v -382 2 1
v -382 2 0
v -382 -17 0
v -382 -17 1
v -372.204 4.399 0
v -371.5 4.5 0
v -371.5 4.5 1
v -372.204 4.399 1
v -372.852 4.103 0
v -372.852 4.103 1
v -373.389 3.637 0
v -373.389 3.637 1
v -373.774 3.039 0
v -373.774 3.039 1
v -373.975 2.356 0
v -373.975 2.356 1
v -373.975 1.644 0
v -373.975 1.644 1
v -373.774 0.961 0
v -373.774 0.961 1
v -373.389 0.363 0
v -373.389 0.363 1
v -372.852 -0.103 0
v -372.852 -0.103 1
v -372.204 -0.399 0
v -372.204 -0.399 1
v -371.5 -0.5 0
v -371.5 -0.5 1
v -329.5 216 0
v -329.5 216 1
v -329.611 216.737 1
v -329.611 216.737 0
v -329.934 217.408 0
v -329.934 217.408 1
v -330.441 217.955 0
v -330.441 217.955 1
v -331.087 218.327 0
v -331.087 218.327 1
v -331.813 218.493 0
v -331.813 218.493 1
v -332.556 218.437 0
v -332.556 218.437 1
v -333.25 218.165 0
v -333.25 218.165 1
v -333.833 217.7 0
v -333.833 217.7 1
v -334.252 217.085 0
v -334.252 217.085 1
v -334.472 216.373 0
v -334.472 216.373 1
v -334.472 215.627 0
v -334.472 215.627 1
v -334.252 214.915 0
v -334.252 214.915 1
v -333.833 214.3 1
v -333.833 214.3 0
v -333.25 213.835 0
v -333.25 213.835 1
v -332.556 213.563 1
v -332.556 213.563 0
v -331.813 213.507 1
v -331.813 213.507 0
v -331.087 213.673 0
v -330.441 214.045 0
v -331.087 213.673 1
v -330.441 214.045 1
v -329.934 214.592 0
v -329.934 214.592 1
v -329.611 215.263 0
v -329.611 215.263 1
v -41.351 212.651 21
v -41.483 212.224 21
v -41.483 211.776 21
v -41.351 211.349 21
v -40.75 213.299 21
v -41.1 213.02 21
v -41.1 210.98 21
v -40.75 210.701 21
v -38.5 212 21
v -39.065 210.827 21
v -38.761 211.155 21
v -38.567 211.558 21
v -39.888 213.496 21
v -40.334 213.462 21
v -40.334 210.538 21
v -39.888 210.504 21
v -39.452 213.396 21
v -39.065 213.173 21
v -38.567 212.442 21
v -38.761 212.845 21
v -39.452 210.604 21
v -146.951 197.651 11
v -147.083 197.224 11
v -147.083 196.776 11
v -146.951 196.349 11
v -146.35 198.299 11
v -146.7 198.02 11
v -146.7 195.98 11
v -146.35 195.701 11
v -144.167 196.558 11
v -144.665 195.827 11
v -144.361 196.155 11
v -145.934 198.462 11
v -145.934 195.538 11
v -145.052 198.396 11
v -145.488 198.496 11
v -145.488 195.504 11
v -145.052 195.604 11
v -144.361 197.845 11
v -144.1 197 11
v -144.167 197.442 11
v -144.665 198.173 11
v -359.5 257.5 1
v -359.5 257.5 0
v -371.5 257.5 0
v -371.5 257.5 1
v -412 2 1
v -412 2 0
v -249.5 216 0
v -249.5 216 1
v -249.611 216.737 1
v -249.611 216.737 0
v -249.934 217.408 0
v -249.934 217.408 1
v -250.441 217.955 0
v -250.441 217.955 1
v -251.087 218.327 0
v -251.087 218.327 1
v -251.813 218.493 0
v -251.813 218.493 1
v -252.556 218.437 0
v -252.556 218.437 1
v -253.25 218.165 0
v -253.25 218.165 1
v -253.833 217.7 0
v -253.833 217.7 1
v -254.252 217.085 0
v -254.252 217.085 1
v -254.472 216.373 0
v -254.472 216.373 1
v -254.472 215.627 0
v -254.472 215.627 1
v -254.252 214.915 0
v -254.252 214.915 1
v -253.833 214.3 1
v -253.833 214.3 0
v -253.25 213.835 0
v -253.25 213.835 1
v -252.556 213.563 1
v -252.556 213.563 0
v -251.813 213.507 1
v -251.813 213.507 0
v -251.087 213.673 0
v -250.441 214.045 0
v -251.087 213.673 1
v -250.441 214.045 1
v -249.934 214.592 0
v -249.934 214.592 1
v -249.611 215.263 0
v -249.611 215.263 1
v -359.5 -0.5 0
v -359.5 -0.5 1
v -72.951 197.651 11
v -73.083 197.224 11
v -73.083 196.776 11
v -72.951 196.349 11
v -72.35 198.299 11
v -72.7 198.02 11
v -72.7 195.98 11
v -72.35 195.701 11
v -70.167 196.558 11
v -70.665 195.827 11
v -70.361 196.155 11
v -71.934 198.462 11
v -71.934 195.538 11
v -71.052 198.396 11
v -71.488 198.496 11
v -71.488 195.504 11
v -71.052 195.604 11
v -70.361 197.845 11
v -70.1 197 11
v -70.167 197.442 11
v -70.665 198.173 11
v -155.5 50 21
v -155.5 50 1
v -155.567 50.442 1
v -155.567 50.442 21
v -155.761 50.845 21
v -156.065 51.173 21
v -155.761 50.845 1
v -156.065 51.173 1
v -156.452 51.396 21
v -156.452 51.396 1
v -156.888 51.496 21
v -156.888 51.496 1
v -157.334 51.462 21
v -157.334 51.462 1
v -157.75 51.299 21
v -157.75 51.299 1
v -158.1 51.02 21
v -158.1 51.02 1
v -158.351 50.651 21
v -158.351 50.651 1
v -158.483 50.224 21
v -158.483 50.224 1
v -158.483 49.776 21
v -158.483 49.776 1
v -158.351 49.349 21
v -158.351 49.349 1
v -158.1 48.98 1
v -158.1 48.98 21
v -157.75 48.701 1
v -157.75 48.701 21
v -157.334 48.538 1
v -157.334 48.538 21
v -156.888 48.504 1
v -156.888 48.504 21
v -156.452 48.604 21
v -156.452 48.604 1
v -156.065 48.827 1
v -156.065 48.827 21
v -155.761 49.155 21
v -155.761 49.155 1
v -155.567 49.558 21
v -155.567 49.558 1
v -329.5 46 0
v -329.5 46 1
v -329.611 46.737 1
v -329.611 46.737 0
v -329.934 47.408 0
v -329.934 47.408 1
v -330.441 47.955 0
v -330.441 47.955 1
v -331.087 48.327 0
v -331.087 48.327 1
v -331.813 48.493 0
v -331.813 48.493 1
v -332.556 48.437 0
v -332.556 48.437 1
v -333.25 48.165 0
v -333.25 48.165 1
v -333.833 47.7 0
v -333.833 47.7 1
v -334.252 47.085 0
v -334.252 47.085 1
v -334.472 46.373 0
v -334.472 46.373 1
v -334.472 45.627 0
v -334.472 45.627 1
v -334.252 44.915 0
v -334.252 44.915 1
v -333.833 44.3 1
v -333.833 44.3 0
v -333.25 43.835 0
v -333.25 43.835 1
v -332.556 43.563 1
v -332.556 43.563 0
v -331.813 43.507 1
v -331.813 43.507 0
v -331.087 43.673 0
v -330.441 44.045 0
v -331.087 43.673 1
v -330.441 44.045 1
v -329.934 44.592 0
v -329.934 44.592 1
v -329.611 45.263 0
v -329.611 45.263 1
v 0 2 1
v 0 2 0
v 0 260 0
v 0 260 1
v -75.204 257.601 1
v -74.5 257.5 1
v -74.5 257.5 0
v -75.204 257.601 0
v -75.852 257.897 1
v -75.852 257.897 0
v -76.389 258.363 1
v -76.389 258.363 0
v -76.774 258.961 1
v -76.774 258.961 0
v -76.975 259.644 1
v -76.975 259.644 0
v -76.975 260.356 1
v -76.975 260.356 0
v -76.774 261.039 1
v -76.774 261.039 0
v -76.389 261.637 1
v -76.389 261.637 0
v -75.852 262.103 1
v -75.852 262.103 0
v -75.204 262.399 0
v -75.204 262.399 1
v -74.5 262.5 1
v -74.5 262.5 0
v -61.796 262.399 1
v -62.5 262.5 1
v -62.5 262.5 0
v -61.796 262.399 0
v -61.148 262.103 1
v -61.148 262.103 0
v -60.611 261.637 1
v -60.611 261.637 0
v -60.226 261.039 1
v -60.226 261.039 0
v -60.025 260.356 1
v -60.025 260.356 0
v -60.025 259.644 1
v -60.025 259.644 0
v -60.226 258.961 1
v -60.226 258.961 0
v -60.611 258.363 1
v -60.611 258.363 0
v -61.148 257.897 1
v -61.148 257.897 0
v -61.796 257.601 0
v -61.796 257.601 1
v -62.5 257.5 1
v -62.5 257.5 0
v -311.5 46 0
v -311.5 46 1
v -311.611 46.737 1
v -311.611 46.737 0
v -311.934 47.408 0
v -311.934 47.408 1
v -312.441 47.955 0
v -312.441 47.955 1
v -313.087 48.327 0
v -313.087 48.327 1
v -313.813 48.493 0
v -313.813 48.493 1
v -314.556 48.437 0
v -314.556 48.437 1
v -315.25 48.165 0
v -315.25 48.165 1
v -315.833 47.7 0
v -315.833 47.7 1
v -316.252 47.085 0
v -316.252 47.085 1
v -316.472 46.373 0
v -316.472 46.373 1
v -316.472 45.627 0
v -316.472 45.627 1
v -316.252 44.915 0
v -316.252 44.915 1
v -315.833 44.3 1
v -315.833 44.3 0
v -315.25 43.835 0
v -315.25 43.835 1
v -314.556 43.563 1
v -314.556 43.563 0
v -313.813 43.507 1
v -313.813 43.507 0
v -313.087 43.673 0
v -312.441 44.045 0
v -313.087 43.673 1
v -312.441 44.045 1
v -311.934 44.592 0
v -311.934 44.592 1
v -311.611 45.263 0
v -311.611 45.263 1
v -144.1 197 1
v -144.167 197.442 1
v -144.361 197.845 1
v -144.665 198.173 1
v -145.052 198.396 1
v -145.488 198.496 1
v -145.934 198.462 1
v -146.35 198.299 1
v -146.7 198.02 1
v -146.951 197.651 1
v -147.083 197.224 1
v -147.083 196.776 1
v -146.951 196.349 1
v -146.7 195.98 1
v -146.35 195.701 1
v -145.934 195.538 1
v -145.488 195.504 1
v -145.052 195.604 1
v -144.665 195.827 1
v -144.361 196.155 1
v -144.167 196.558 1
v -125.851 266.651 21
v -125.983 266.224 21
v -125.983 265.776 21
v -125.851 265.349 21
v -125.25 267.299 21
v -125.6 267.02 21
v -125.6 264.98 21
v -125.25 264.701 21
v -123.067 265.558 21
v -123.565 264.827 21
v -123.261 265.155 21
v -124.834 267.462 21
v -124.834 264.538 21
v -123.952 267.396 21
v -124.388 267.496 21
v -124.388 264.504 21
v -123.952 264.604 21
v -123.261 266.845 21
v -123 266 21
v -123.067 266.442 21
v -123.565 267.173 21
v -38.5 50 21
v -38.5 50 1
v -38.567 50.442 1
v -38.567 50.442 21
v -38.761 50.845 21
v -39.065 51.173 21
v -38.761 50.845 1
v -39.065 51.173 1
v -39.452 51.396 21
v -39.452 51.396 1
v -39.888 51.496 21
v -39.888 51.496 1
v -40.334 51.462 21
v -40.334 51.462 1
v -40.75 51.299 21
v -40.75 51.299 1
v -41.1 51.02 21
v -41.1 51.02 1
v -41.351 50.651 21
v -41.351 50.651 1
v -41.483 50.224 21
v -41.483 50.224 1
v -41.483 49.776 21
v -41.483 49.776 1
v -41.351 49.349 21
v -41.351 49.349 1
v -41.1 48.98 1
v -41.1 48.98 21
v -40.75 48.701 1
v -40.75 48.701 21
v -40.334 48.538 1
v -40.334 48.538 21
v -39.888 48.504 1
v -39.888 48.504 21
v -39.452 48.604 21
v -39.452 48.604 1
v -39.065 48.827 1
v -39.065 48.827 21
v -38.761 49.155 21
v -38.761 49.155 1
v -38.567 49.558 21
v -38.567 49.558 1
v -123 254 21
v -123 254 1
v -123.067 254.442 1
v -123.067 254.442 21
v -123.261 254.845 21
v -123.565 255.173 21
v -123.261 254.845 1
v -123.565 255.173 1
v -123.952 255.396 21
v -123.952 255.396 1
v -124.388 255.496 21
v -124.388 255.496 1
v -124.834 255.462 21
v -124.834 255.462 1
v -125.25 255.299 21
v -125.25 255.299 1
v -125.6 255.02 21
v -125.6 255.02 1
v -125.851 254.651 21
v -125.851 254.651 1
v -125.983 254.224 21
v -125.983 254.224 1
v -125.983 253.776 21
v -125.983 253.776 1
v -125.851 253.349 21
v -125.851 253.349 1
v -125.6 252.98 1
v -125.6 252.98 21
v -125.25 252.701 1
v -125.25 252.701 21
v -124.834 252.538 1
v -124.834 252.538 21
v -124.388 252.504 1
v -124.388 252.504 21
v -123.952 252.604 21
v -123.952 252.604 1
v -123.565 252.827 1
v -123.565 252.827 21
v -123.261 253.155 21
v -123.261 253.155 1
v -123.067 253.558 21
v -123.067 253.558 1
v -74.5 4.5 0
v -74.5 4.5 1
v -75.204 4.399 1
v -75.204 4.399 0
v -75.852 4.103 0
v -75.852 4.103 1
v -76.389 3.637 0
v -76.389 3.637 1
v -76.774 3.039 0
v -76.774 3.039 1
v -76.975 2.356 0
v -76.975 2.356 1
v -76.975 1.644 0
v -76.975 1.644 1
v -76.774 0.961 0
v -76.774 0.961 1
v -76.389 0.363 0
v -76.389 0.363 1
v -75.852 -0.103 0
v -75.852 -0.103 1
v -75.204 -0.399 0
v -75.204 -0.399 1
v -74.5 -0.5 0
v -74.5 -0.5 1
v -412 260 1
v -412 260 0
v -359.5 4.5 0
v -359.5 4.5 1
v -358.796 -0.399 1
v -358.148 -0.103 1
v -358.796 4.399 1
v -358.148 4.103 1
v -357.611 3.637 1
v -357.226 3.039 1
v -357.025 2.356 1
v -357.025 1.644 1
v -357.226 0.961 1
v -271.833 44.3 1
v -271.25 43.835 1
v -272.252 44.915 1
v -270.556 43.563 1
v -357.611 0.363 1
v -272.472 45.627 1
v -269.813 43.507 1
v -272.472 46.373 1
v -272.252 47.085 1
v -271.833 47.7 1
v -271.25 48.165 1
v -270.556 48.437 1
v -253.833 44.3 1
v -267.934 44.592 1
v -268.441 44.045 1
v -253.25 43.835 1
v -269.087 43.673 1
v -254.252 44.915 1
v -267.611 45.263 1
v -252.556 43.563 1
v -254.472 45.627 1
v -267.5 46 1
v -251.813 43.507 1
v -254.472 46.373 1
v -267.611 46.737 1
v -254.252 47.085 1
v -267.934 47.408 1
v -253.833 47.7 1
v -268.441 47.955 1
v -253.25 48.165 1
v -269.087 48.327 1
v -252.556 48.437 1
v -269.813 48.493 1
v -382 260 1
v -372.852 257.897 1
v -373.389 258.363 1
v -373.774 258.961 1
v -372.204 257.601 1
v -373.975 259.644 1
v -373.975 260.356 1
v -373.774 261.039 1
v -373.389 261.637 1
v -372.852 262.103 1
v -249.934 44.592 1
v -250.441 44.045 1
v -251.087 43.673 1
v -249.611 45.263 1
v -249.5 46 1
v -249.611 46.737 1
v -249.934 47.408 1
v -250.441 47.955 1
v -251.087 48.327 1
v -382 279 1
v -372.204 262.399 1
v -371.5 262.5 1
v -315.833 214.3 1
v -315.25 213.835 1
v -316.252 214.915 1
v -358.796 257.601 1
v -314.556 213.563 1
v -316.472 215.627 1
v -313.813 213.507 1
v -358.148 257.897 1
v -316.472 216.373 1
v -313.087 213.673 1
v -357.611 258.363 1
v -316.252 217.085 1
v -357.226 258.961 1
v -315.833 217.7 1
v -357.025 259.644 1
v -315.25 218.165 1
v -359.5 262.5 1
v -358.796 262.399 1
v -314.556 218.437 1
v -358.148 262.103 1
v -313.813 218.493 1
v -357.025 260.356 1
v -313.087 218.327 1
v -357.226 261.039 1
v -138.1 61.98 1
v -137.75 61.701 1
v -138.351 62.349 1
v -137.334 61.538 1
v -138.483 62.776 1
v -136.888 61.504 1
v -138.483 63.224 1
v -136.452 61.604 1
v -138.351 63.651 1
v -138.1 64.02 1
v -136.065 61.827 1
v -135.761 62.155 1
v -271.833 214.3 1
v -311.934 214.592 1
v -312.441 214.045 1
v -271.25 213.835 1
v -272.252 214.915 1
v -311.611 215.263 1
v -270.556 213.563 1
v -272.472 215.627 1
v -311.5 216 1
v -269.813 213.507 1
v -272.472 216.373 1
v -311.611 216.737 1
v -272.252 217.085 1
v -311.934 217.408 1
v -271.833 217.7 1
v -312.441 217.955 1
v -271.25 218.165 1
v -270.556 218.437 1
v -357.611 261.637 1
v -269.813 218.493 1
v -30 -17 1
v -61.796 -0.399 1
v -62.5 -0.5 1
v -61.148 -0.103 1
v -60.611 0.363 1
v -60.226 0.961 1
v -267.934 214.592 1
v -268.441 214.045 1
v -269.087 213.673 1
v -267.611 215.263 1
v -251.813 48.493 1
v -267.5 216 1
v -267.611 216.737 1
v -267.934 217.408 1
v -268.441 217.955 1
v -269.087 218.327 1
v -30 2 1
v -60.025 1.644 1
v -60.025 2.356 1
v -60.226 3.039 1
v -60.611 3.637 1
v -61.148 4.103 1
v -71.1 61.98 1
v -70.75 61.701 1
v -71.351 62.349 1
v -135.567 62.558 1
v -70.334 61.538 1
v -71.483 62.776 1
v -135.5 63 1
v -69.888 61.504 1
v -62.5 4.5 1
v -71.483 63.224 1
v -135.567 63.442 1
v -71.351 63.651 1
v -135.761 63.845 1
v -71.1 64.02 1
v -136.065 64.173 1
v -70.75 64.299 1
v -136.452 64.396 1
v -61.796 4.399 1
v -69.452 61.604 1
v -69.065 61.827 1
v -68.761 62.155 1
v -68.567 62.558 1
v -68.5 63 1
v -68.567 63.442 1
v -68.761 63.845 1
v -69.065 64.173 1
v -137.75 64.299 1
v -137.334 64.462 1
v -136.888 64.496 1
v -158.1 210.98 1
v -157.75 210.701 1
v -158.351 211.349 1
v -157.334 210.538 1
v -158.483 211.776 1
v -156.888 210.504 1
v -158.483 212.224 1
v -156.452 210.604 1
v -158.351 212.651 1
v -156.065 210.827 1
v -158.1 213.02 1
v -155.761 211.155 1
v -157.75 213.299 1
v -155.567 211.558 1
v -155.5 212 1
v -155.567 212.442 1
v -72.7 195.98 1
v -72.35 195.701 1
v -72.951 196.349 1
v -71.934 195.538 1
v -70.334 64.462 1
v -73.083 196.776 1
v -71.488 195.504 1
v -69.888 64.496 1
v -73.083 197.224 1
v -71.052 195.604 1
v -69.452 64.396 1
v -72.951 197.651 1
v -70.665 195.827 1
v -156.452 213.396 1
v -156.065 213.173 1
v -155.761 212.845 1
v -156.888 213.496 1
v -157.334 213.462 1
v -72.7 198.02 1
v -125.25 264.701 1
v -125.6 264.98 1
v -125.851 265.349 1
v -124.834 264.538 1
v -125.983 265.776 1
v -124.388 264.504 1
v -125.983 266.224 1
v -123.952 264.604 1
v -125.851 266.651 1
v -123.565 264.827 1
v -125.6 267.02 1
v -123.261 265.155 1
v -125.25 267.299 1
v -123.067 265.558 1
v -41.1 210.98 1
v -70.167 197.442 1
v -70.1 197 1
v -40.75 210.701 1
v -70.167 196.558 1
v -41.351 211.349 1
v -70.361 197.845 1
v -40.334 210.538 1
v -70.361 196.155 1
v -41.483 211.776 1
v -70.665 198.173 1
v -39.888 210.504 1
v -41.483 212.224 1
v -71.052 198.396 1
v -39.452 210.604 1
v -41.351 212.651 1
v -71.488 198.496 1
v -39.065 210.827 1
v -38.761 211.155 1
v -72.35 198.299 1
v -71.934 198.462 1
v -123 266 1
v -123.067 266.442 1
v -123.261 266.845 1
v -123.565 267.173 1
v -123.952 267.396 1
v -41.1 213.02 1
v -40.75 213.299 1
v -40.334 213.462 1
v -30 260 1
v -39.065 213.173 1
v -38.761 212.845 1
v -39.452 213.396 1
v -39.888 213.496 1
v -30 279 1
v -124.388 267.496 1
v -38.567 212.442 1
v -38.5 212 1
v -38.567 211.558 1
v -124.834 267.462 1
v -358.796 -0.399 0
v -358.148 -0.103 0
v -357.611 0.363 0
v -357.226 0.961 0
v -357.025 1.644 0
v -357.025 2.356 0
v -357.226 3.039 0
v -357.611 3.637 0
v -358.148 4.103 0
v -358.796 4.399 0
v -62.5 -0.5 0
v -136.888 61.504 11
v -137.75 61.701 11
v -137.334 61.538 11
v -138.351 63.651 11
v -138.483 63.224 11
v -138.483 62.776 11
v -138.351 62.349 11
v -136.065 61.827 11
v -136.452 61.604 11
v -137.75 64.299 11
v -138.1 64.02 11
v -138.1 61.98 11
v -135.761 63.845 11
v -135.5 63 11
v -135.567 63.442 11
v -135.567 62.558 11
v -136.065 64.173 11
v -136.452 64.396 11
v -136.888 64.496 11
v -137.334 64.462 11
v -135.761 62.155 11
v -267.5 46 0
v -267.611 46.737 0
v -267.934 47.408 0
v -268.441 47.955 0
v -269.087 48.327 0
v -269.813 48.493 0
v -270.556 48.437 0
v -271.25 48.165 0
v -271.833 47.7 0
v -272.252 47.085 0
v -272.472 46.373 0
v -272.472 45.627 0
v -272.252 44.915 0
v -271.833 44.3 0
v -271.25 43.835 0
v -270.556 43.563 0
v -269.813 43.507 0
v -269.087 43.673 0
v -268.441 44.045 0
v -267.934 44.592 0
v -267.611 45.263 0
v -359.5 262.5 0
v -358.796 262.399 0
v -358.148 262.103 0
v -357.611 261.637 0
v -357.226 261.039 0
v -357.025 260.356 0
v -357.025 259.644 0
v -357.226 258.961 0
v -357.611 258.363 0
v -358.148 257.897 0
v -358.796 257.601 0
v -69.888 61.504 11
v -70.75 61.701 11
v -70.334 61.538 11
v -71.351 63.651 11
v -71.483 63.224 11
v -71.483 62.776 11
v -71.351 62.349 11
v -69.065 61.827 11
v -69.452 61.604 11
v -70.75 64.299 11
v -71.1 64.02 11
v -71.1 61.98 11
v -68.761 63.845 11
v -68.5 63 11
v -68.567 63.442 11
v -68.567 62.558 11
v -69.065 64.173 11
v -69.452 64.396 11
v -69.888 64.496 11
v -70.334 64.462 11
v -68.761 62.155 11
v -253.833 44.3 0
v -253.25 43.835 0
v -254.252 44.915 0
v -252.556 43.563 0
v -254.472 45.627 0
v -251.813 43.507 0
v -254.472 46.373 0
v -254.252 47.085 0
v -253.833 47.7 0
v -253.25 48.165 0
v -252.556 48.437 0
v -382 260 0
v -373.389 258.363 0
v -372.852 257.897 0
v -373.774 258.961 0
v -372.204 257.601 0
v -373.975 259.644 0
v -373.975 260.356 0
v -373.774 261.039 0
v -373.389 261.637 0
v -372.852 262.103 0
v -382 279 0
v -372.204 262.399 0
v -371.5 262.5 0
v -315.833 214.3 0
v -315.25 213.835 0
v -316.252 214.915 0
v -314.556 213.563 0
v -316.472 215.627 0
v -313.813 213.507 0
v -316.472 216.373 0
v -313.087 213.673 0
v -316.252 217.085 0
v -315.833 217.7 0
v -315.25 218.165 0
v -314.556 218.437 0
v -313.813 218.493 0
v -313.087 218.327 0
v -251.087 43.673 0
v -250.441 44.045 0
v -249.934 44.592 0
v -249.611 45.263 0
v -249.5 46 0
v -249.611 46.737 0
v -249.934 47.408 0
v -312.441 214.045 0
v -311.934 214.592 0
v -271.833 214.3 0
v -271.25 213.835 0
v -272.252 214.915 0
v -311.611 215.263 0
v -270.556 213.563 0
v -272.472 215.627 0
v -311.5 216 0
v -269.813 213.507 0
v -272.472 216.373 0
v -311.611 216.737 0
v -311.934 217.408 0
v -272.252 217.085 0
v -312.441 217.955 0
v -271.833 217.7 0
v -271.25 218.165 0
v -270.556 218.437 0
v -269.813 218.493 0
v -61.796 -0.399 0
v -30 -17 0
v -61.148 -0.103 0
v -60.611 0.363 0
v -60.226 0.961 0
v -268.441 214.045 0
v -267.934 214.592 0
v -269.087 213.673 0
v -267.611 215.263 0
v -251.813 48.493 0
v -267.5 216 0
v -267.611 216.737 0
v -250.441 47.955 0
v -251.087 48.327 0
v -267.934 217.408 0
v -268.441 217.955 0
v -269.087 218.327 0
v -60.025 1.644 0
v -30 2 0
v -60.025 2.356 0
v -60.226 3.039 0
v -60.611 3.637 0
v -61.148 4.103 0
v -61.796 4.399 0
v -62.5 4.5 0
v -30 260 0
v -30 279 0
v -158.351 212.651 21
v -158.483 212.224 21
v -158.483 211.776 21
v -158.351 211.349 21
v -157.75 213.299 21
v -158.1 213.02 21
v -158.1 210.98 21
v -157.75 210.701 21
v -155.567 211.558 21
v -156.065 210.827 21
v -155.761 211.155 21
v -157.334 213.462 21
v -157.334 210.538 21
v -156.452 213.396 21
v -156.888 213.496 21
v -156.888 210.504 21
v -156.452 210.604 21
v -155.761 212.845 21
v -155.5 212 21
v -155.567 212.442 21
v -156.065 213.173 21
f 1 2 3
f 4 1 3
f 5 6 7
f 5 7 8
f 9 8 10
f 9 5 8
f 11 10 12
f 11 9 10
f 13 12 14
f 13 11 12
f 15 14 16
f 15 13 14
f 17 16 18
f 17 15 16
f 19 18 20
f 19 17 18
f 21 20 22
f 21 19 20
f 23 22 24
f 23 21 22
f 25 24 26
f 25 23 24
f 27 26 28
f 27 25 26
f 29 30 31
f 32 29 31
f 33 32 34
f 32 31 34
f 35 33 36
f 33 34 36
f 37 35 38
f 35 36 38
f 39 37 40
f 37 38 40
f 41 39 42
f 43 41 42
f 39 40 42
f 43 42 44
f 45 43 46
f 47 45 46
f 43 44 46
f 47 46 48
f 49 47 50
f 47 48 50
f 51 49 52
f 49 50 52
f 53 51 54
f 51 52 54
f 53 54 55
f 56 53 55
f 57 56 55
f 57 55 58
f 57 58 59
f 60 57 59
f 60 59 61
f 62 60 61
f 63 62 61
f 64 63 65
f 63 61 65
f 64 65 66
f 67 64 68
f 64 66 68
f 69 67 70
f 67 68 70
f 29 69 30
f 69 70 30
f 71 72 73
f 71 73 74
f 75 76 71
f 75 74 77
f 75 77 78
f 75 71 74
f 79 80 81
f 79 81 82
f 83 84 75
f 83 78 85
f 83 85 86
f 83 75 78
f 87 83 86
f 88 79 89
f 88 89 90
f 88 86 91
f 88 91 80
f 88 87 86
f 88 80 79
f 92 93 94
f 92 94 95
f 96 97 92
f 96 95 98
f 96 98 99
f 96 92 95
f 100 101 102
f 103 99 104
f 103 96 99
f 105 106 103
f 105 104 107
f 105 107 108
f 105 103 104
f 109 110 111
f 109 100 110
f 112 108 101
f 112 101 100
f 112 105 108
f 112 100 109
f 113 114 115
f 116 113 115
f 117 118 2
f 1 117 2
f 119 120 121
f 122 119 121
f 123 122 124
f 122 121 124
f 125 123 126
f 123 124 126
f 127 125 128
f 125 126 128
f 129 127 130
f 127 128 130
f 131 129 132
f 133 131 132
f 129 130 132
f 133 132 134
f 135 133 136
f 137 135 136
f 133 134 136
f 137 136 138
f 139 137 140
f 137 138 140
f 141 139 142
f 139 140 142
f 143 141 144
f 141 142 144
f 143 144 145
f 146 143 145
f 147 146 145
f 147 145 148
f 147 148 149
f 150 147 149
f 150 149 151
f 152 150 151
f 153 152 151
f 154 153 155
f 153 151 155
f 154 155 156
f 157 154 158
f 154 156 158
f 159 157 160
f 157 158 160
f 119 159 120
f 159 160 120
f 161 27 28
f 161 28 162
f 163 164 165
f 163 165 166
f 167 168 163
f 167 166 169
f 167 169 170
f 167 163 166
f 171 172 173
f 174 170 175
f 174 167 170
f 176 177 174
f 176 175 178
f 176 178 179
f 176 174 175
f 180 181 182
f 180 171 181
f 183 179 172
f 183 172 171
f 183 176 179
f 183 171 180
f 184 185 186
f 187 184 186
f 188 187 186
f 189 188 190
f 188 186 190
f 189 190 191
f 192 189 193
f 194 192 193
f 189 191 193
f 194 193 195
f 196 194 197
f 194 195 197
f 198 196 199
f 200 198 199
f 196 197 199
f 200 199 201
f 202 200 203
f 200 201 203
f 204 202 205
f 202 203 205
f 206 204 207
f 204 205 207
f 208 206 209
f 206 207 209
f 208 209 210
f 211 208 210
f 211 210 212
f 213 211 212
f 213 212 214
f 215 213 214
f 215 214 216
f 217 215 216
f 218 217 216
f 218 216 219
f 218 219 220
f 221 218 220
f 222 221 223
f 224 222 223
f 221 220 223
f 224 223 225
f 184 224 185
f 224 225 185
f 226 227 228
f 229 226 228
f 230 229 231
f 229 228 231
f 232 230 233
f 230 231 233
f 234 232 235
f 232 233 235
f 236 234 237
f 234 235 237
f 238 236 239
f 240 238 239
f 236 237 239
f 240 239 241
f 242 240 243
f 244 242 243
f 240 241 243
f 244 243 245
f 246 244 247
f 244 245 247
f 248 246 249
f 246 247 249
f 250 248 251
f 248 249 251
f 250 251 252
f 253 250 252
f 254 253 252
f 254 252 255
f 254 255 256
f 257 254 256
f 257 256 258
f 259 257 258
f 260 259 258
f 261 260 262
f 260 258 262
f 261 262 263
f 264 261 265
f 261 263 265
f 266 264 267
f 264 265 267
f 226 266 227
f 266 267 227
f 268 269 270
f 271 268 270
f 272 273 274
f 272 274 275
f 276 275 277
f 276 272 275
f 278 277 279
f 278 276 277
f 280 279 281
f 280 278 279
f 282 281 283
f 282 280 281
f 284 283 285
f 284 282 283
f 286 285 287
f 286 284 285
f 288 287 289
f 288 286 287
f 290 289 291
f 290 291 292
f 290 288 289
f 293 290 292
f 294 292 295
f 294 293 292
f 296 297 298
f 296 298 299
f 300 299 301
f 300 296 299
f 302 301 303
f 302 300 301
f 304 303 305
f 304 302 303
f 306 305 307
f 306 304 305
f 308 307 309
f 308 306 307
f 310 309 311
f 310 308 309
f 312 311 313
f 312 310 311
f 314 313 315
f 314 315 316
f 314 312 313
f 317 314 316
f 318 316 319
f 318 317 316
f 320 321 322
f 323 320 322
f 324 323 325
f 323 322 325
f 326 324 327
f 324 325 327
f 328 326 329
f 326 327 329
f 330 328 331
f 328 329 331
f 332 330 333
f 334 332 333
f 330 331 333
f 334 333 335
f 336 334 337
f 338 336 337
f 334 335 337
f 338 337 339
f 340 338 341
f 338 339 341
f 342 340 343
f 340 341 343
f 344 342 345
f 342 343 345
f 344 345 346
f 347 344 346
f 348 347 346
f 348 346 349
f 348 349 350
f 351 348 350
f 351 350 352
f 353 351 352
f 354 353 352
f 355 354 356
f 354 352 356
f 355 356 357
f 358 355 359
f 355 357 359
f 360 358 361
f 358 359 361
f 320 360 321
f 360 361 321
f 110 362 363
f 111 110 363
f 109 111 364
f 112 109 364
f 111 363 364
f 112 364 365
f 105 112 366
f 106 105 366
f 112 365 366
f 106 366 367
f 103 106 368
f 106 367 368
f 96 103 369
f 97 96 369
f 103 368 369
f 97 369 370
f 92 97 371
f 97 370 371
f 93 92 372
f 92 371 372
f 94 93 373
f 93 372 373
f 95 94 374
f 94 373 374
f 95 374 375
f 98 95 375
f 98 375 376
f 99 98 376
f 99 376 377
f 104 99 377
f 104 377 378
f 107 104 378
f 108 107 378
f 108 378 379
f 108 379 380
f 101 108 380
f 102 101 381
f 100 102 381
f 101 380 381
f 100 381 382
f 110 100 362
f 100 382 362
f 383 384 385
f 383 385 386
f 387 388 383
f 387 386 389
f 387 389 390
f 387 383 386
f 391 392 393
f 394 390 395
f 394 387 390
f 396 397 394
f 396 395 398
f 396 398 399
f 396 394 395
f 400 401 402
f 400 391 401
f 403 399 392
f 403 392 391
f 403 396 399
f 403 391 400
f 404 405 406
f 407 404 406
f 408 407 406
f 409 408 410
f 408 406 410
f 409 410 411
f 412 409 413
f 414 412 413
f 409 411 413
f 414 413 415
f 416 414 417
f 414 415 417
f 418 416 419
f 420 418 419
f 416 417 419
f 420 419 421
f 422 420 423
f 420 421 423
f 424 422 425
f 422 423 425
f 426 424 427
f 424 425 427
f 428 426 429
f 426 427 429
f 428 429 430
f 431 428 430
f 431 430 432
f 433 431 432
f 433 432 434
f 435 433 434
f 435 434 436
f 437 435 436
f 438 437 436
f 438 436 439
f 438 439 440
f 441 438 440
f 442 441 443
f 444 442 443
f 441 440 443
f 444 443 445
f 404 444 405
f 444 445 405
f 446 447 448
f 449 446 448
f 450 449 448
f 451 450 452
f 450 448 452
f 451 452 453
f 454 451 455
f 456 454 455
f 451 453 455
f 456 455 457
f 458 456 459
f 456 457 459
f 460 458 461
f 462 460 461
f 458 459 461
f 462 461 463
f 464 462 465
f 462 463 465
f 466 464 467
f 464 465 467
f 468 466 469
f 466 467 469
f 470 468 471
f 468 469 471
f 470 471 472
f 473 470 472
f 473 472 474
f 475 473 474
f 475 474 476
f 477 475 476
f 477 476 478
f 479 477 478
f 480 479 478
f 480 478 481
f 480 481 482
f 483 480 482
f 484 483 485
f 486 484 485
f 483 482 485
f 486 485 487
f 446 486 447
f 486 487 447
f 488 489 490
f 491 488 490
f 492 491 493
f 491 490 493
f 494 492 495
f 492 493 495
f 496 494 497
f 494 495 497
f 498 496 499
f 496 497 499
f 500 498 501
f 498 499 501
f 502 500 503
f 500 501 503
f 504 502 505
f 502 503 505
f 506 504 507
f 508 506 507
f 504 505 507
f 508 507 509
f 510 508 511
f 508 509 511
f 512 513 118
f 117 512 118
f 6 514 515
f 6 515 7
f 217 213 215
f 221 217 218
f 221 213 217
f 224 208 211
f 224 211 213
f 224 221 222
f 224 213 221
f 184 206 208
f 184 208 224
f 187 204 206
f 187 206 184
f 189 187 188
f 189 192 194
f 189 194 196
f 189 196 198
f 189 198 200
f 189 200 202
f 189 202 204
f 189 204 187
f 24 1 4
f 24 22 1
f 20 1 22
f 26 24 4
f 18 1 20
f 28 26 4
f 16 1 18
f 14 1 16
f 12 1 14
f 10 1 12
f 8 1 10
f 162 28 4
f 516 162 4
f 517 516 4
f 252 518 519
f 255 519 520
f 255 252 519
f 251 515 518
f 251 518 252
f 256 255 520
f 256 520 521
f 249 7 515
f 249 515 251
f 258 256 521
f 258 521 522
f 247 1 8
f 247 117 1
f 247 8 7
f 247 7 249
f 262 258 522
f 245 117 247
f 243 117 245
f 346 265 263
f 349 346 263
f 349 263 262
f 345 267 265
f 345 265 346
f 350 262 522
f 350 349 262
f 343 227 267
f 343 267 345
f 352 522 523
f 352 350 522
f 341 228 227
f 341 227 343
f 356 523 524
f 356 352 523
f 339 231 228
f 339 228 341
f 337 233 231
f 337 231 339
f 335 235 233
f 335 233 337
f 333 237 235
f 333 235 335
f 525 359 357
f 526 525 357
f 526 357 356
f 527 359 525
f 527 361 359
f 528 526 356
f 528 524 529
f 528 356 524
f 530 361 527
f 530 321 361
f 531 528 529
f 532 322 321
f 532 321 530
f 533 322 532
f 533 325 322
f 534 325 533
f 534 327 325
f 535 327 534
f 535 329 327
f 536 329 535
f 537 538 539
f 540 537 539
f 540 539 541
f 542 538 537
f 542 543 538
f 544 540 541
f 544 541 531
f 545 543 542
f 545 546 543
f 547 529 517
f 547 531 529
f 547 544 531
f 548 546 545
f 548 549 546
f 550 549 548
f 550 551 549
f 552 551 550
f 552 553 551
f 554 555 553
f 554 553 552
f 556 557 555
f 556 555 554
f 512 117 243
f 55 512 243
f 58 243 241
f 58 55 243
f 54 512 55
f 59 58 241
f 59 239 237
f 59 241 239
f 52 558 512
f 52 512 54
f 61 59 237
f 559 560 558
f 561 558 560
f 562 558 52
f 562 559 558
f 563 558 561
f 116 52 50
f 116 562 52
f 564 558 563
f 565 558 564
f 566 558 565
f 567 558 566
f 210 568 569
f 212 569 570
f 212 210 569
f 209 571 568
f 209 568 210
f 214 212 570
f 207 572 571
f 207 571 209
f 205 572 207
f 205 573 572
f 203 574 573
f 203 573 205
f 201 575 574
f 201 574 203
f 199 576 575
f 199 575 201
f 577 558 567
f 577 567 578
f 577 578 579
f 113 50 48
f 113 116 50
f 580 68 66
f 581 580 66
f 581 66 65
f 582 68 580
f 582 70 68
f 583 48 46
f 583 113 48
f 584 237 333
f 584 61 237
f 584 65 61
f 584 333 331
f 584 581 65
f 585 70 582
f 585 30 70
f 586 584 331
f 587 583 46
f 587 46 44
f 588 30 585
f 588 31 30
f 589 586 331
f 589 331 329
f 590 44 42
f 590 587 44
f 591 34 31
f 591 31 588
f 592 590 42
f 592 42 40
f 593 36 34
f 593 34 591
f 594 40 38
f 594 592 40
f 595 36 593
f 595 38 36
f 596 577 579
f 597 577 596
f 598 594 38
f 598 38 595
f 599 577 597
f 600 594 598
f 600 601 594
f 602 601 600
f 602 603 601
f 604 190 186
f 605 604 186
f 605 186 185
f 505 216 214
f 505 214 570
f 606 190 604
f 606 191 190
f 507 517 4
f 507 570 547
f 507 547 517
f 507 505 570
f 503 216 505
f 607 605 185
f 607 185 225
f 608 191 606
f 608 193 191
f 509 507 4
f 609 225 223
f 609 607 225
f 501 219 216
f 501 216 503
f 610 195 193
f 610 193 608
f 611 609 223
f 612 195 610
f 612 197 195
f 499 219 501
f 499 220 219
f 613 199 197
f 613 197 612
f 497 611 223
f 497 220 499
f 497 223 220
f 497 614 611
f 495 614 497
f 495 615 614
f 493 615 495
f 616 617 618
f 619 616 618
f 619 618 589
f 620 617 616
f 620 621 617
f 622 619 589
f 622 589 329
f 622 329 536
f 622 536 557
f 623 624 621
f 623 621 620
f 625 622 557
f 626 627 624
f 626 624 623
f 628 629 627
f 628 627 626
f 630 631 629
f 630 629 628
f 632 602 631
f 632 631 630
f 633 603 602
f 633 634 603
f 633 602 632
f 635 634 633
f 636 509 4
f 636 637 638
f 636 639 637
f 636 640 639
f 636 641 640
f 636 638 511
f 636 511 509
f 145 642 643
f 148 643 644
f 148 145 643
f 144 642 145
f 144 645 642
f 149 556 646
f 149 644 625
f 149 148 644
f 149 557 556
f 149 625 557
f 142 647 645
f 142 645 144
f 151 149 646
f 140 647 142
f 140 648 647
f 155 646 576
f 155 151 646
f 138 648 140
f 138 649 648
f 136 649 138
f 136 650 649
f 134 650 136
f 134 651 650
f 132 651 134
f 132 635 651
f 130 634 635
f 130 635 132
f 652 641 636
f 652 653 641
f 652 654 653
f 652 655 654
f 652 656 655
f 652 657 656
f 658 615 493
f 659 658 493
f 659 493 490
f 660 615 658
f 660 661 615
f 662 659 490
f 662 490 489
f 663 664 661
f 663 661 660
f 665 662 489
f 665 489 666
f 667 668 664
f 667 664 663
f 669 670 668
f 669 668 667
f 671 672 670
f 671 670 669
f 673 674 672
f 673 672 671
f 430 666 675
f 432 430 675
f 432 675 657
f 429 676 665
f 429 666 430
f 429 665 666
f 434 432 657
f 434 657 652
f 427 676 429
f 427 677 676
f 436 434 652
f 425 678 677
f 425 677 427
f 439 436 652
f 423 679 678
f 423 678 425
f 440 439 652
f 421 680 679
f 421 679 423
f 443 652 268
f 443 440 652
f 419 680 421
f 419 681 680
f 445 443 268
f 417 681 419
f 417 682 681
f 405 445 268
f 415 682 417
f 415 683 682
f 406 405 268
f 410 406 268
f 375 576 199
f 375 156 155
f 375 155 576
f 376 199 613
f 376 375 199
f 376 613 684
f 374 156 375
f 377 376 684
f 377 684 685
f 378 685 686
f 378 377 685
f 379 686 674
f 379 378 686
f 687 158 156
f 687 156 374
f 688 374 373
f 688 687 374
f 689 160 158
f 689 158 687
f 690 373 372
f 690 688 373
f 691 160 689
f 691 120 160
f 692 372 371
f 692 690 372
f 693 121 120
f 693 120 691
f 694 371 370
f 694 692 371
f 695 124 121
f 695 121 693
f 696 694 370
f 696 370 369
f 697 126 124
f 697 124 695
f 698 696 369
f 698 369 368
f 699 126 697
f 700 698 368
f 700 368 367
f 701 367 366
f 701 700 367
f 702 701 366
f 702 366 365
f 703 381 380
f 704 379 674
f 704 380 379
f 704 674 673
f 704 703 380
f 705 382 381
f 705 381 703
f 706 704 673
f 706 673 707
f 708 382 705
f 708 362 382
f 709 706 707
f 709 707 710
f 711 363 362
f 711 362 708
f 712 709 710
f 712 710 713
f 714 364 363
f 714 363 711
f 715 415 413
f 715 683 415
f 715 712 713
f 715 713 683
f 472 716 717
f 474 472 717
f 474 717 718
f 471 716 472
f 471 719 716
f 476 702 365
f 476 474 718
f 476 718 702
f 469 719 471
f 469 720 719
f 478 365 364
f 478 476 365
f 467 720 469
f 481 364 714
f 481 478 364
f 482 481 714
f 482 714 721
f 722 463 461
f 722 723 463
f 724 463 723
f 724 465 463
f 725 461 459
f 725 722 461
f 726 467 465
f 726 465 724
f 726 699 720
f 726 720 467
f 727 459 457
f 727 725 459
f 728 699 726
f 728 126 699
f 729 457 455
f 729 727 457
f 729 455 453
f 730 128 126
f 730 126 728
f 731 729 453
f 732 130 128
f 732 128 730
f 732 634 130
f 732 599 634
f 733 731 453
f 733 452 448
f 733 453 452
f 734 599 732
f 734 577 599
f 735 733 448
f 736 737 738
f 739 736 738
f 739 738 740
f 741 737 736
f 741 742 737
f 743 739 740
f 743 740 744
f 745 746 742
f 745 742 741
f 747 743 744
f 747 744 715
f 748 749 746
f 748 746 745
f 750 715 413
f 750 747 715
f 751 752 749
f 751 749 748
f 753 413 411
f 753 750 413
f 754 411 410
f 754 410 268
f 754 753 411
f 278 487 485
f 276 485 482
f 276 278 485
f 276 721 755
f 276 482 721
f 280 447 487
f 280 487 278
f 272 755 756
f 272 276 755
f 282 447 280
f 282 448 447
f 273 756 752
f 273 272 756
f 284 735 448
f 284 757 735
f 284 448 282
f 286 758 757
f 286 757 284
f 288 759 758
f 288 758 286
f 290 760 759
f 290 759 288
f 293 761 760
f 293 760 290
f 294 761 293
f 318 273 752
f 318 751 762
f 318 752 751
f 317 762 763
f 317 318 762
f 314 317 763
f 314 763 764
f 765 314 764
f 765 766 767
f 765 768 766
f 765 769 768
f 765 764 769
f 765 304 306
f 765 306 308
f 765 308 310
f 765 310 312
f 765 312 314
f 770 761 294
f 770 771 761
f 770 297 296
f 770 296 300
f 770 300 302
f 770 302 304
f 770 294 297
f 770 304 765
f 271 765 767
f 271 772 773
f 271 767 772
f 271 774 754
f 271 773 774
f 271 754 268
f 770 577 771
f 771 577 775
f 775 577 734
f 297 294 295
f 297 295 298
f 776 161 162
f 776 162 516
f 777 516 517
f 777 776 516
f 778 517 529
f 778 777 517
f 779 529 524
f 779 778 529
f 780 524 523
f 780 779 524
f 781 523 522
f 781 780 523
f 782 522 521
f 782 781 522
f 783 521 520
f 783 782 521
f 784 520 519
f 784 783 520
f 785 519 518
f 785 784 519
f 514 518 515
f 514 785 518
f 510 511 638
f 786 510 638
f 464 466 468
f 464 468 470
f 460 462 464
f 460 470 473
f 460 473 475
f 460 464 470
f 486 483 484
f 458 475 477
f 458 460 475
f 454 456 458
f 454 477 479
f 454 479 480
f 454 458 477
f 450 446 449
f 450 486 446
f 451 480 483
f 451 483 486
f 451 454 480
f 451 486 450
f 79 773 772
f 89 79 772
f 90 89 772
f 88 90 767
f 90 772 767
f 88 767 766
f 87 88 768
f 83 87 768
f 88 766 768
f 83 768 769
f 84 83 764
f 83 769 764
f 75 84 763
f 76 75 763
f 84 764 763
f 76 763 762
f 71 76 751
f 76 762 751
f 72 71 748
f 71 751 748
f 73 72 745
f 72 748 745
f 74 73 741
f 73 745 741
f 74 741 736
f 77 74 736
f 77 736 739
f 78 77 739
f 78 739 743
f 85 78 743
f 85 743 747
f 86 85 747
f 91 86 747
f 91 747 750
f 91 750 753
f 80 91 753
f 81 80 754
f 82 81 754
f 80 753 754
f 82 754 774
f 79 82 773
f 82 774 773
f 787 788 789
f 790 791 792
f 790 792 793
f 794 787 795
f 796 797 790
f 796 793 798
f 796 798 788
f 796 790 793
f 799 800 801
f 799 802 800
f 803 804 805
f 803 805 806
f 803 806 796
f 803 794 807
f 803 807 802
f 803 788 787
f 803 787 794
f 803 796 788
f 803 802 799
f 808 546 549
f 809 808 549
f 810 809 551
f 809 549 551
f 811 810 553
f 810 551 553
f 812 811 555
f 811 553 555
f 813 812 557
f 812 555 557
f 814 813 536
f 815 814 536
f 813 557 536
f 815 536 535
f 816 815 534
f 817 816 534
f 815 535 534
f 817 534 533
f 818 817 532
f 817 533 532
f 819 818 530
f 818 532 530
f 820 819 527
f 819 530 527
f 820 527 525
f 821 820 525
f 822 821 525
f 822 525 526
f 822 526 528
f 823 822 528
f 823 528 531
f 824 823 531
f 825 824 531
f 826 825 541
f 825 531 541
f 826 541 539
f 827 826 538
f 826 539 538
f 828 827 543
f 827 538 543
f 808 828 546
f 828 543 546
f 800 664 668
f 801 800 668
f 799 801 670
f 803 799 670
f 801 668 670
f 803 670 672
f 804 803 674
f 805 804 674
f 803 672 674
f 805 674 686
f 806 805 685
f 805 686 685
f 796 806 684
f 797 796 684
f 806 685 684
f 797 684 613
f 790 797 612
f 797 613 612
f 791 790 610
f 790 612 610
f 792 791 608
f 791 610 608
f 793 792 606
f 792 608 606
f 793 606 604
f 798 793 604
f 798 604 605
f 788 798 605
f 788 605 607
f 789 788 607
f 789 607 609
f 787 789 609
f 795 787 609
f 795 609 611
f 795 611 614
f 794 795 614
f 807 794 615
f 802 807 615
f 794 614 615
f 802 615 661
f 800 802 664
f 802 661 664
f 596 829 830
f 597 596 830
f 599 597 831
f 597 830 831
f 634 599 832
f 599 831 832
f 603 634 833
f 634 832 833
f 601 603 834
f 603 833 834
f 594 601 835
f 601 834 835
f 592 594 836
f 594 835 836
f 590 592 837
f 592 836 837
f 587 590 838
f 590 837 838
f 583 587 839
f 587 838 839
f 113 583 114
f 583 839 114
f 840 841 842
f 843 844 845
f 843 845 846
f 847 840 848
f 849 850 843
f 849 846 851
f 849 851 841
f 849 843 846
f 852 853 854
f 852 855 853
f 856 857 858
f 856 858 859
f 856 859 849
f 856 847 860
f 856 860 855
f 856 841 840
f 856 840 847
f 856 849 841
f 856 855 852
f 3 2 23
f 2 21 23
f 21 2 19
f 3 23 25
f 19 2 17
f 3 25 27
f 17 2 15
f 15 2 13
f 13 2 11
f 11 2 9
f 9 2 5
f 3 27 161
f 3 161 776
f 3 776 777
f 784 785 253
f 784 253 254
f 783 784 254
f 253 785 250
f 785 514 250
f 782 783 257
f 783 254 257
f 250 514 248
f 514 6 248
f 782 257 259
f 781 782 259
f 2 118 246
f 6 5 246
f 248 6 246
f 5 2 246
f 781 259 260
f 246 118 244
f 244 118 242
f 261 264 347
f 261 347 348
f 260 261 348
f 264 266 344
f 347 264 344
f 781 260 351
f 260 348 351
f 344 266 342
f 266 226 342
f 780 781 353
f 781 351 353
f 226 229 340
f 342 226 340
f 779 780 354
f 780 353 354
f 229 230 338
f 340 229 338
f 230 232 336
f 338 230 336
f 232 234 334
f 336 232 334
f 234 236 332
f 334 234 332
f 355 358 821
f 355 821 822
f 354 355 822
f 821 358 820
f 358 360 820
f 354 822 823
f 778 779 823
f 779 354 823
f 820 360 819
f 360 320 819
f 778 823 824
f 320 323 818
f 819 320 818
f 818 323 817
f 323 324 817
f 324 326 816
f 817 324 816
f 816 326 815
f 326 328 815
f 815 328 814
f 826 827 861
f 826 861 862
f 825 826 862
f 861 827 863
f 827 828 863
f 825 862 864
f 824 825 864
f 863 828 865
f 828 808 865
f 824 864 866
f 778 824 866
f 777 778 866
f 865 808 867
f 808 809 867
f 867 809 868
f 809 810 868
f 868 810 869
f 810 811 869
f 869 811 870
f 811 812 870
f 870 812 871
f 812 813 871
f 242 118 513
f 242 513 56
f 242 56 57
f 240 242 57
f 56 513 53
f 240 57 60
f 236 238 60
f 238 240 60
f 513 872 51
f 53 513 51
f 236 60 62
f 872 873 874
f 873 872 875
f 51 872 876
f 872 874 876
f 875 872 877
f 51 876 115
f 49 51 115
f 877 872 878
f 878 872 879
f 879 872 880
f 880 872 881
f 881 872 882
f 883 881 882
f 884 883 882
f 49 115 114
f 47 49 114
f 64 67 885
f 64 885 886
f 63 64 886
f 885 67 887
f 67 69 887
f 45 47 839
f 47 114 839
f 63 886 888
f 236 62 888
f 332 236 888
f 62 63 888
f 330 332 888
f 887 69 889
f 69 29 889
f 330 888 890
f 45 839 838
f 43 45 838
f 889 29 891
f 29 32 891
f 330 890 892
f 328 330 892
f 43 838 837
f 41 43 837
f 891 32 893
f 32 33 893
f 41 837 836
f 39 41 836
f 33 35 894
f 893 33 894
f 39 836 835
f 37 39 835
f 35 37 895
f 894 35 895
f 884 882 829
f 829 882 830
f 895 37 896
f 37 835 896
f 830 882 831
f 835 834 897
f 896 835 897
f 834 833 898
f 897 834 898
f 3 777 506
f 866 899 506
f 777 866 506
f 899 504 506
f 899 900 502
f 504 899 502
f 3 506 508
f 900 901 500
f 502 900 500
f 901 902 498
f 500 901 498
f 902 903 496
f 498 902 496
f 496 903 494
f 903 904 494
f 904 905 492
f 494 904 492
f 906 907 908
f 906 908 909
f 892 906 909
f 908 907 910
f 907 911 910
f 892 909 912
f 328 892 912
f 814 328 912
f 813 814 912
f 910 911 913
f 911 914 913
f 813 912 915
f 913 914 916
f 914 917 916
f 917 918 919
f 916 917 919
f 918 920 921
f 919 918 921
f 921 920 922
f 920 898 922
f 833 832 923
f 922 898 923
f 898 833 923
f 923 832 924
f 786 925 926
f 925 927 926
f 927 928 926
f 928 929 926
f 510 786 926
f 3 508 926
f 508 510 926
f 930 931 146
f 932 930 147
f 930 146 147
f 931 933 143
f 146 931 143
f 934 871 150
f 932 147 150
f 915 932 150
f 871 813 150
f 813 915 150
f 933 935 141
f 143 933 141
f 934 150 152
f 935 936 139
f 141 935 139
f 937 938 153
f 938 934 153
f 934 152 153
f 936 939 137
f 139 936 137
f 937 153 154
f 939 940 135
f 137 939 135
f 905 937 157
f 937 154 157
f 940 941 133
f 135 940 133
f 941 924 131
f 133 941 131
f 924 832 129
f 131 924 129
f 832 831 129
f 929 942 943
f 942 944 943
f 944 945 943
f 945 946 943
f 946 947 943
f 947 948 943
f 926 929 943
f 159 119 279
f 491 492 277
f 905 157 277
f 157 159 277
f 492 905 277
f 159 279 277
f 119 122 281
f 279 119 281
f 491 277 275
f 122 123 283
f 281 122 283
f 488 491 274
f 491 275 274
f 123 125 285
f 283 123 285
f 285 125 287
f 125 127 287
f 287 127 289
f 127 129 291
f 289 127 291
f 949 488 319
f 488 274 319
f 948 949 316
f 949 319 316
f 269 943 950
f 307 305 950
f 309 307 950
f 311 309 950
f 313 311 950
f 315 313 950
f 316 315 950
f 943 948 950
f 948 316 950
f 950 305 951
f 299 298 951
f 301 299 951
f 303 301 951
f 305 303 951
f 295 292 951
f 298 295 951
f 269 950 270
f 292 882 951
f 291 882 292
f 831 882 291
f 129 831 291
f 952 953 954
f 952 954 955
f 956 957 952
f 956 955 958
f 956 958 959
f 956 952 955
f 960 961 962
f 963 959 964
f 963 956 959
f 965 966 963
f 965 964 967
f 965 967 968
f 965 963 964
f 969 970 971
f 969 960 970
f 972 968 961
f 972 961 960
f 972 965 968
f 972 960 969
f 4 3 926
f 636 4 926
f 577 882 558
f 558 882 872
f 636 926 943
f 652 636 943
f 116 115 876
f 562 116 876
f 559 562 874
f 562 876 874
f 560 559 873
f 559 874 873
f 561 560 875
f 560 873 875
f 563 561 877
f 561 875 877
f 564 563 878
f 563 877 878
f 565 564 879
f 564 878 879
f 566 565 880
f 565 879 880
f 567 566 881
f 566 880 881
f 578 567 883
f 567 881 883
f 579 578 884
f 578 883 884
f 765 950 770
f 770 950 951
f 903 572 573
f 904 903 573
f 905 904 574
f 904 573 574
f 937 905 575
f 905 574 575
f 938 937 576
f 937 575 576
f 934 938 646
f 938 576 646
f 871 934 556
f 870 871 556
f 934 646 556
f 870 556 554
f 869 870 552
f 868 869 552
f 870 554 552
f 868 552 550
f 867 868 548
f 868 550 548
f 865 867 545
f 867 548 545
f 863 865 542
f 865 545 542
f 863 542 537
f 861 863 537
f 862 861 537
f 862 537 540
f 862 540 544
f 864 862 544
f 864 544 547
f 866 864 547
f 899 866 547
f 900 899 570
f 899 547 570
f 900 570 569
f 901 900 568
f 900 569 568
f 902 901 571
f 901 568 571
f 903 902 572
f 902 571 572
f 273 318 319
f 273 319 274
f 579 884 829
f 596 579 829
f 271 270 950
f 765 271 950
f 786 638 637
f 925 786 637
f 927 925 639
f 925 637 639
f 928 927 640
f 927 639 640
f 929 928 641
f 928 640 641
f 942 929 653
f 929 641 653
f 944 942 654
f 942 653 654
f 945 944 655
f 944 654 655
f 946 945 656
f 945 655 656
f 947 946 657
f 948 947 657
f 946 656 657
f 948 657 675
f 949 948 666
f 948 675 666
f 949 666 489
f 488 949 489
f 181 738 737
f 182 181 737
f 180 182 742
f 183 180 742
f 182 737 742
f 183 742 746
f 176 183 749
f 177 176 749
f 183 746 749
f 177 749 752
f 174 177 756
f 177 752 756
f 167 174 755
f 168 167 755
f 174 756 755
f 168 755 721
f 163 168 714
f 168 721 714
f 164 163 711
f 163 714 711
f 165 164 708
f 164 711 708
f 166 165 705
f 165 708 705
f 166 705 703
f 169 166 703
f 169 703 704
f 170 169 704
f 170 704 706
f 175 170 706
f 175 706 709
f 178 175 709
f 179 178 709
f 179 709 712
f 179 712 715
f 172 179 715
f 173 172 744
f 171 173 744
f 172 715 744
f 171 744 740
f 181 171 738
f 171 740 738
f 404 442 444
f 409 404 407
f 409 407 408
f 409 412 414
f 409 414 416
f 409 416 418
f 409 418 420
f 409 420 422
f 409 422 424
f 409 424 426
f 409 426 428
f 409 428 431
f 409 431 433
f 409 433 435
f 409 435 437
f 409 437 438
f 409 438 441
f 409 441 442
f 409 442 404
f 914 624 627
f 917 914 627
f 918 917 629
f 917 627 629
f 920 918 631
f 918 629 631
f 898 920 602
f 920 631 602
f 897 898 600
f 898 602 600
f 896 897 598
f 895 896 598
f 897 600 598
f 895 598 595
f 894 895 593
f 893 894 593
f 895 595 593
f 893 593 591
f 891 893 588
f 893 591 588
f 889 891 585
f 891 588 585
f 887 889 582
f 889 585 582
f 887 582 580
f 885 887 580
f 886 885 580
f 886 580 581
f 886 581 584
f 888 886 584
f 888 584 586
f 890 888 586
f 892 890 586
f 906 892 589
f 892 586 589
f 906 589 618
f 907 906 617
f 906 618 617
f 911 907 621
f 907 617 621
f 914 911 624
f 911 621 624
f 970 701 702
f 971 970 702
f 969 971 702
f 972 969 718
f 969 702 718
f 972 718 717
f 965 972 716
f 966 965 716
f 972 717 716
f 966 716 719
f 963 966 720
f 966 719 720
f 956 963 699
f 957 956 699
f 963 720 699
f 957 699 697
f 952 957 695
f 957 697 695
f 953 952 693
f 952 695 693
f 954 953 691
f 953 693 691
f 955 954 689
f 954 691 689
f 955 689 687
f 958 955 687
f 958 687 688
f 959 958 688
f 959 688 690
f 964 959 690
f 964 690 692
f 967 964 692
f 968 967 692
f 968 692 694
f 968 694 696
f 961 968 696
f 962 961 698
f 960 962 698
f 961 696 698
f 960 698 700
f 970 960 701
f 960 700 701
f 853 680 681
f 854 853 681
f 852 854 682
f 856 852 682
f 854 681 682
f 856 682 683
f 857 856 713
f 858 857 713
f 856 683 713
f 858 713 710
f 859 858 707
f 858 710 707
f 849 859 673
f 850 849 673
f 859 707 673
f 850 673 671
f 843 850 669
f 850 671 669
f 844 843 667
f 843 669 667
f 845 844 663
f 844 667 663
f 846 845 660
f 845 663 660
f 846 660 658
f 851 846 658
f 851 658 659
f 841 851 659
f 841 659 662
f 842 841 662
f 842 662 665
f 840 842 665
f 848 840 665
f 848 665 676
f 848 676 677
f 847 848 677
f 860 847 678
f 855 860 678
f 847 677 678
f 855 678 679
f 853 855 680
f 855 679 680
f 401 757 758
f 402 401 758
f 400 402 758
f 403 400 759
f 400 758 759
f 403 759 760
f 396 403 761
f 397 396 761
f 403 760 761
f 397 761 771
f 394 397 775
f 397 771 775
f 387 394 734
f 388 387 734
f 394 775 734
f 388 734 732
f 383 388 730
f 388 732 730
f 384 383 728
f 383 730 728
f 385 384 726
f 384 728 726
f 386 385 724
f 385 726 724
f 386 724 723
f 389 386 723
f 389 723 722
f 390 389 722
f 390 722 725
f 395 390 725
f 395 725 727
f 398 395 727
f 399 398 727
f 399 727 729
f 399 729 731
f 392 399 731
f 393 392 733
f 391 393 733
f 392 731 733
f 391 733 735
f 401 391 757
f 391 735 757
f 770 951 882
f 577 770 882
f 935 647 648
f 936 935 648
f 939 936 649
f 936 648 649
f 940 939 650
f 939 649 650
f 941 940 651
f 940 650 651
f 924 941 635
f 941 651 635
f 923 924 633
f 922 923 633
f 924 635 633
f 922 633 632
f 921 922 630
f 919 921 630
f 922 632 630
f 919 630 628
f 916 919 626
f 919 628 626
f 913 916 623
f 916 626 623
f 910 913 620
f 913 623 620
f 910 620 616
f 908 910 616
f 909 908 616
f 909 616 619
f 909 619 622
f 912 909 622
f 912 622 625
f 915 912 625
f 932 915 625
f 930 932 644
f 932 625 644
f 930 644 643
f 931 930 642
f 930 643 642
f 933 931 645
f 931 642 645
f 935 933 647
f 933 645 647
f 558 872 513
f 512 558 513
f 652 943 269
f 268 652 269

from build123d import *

# Parameters (mm, degrees)
SALIENTE_EXTRUIR1_DEPTH = 1
CORTAR_EXTRUIR1_DEPTH   = 1
CROQUIS3_R              = 1.5
SALIENTE_EXTRUIR5_DEPTH = 20
CROQUIS4_R              = 1.5
SALIENTE_EXTRUIR6_DEPTH = 10
CROQUIS5_R              = 2.5
CORTAR_EXTRUIR2_DEPTH   = 1
CROQUIS7_R              = 1.5
SALIENTE_EXTRUIR7_DEPTH = 20


with BuildPart() as part:
    # Croquis1 → Saliente-Extruir1 (new body)
    with BuildSketch(Plane.XY):
        Polygon((-30, 279), (-382, 279), (-382, 260), (-412, 260), (-412, 2), (-382, 2), (-382, -17), (-30, -17), (-30, 2), (0, 2), (0, 260), (-30, 260), align=None)
        with BuildLine():
            Line((-371.5, 262.5), (-359.5, 262.5))
            ThreePointArc((-359.5, 262.5), (-357, 260), (-359.5, 257.5))
            Line((-359.5, 257.5), (-371.5, 257.5))
            ThreePointArc((-371.5, 257.5), (-374, 260), (-371.5, 262.5))
        make_face(mode=Mode.SUBTRACT)
        with BuildLine():
            Line((-371.5, -0.5), (-359.5, -0.5))
            ThreePointArc((-359.5, -0.5), (-357, 2), (-359.5, 4.5))
            Line((-359.5, 4.5), (-371.5, 4.5))
            ThreePointArc((-371.5, 4.5), (-374, 2), (-371.5, -0.5))
        make_face(mode=Mode.SUBTRACT)
    extrude(amount=SALIENTE_EXTRUIR1_DEPTH)

    # Croquis2 → Cortar-Extruir1 (cut)
    with BuildSketch(Plane.XY.offset(1)):
        with BuildLine():
            Line((-62.5, 257.5), (-74.5, 257.5))
            ThreePointArc((-74.5, 257.5), (-77, 260), (-74.5, 262.5))
            Line((-74.5, 262.5), (-62.5, 262.5))
            ThreePointArc((-62.5, 262.5), (-60, 260), (-62.5, 257.5))
        make_face()
        with BuildLine():
            Line((-62.5, 4.5), (-74.5, 4.5))
            ThreePointArc((-74.5, 4.5), (-77, 2), (-74.5, -0.5))
            Line((-74.5, -0.5), (-62.5, -0.5))
            ThreePointArc((-62.5, -0.5), (-60, 2), (-62.5, 4.5))
        make_face()
    extrude(amount=-CORTAR_EXTRUIR1_DEPTH, mode=Mode.SUBTRACT)

    # Croquis3 → Saliente-Extruir5 (add)
    with BuildSketch(Plane.XY.offset(1)):
        with Locations((-40, 212)):
            Circle(CROQUIS3_R)
        with Locations((-40, 50)):
            Circle(CROQUIS3_R)
        with Locations((-157, 50)):
            Circle(CROQUIS3_R)
        with Locations((-157, 212)):
            Circle(CROQUIS3_R)
    extrude(amount=SALIENTE_EXTRUIR5_DEPTH)

    # Croquis4 → Saliente-Extruir6 (add)
    with BuildSketch(Plane.XY.offset(1)):
        with Locations((-71.6, 197)):
            Circle(CROQUIS4_R)
        with Locations((-70, 63)):
            Circle(CROQUIS4_R)
        with Locations((-137, 63)):
            Circle(CROQUIS4_R)
        with Locations((-145.6, 197)):
            Circle(CROQUIS4_R)
    extrude(amount=SALIENTE_EXTRUIR6_DEPTH)

    # Croquis5 → Cortar-Extruir2 (cut)
    with BuildSketch(Plane.XY.offset(1)):
        with Locations((-332, 216)):
            Circle(CROQUIS5_R)
        with Locations((-332, 46)):
            Circle(CROQUIS5_R)
        with Locations((-314, 216)):
            Circle(CROQUIS5_R)
        with Locations((-314, 46)):
            Circle(CROQUIS5_R)
        with Locations((-270, 46)):
            Circle(CROQUIS5_R)
        with Locations((-252, 46)):
            Circle(CROQUIS5_R)
        with Locations((-270, 216)):
            Circle(CROQUIS5_R)
        with Locations((-252, 216)):
            Circle(CROQUIS5_R)
    extrude(amount=-CORTAR_EXTRUIR2_DEPTH, mode=Mode.SUBTRACT)

    # Croquis7 → Saliente-Extruir7 (add)
    with BuildSketch(Plane.XY.offset(1)):
        with Locations((-124.5, 266)):
            Circle(CROQUIS7_R)
        with Locations((-124.5, 254)):
            Circle(CROQUIS7_R)
    extrude(amount=SALIENTE_EXTRUIR7_DEPTH)


solid = part.part
